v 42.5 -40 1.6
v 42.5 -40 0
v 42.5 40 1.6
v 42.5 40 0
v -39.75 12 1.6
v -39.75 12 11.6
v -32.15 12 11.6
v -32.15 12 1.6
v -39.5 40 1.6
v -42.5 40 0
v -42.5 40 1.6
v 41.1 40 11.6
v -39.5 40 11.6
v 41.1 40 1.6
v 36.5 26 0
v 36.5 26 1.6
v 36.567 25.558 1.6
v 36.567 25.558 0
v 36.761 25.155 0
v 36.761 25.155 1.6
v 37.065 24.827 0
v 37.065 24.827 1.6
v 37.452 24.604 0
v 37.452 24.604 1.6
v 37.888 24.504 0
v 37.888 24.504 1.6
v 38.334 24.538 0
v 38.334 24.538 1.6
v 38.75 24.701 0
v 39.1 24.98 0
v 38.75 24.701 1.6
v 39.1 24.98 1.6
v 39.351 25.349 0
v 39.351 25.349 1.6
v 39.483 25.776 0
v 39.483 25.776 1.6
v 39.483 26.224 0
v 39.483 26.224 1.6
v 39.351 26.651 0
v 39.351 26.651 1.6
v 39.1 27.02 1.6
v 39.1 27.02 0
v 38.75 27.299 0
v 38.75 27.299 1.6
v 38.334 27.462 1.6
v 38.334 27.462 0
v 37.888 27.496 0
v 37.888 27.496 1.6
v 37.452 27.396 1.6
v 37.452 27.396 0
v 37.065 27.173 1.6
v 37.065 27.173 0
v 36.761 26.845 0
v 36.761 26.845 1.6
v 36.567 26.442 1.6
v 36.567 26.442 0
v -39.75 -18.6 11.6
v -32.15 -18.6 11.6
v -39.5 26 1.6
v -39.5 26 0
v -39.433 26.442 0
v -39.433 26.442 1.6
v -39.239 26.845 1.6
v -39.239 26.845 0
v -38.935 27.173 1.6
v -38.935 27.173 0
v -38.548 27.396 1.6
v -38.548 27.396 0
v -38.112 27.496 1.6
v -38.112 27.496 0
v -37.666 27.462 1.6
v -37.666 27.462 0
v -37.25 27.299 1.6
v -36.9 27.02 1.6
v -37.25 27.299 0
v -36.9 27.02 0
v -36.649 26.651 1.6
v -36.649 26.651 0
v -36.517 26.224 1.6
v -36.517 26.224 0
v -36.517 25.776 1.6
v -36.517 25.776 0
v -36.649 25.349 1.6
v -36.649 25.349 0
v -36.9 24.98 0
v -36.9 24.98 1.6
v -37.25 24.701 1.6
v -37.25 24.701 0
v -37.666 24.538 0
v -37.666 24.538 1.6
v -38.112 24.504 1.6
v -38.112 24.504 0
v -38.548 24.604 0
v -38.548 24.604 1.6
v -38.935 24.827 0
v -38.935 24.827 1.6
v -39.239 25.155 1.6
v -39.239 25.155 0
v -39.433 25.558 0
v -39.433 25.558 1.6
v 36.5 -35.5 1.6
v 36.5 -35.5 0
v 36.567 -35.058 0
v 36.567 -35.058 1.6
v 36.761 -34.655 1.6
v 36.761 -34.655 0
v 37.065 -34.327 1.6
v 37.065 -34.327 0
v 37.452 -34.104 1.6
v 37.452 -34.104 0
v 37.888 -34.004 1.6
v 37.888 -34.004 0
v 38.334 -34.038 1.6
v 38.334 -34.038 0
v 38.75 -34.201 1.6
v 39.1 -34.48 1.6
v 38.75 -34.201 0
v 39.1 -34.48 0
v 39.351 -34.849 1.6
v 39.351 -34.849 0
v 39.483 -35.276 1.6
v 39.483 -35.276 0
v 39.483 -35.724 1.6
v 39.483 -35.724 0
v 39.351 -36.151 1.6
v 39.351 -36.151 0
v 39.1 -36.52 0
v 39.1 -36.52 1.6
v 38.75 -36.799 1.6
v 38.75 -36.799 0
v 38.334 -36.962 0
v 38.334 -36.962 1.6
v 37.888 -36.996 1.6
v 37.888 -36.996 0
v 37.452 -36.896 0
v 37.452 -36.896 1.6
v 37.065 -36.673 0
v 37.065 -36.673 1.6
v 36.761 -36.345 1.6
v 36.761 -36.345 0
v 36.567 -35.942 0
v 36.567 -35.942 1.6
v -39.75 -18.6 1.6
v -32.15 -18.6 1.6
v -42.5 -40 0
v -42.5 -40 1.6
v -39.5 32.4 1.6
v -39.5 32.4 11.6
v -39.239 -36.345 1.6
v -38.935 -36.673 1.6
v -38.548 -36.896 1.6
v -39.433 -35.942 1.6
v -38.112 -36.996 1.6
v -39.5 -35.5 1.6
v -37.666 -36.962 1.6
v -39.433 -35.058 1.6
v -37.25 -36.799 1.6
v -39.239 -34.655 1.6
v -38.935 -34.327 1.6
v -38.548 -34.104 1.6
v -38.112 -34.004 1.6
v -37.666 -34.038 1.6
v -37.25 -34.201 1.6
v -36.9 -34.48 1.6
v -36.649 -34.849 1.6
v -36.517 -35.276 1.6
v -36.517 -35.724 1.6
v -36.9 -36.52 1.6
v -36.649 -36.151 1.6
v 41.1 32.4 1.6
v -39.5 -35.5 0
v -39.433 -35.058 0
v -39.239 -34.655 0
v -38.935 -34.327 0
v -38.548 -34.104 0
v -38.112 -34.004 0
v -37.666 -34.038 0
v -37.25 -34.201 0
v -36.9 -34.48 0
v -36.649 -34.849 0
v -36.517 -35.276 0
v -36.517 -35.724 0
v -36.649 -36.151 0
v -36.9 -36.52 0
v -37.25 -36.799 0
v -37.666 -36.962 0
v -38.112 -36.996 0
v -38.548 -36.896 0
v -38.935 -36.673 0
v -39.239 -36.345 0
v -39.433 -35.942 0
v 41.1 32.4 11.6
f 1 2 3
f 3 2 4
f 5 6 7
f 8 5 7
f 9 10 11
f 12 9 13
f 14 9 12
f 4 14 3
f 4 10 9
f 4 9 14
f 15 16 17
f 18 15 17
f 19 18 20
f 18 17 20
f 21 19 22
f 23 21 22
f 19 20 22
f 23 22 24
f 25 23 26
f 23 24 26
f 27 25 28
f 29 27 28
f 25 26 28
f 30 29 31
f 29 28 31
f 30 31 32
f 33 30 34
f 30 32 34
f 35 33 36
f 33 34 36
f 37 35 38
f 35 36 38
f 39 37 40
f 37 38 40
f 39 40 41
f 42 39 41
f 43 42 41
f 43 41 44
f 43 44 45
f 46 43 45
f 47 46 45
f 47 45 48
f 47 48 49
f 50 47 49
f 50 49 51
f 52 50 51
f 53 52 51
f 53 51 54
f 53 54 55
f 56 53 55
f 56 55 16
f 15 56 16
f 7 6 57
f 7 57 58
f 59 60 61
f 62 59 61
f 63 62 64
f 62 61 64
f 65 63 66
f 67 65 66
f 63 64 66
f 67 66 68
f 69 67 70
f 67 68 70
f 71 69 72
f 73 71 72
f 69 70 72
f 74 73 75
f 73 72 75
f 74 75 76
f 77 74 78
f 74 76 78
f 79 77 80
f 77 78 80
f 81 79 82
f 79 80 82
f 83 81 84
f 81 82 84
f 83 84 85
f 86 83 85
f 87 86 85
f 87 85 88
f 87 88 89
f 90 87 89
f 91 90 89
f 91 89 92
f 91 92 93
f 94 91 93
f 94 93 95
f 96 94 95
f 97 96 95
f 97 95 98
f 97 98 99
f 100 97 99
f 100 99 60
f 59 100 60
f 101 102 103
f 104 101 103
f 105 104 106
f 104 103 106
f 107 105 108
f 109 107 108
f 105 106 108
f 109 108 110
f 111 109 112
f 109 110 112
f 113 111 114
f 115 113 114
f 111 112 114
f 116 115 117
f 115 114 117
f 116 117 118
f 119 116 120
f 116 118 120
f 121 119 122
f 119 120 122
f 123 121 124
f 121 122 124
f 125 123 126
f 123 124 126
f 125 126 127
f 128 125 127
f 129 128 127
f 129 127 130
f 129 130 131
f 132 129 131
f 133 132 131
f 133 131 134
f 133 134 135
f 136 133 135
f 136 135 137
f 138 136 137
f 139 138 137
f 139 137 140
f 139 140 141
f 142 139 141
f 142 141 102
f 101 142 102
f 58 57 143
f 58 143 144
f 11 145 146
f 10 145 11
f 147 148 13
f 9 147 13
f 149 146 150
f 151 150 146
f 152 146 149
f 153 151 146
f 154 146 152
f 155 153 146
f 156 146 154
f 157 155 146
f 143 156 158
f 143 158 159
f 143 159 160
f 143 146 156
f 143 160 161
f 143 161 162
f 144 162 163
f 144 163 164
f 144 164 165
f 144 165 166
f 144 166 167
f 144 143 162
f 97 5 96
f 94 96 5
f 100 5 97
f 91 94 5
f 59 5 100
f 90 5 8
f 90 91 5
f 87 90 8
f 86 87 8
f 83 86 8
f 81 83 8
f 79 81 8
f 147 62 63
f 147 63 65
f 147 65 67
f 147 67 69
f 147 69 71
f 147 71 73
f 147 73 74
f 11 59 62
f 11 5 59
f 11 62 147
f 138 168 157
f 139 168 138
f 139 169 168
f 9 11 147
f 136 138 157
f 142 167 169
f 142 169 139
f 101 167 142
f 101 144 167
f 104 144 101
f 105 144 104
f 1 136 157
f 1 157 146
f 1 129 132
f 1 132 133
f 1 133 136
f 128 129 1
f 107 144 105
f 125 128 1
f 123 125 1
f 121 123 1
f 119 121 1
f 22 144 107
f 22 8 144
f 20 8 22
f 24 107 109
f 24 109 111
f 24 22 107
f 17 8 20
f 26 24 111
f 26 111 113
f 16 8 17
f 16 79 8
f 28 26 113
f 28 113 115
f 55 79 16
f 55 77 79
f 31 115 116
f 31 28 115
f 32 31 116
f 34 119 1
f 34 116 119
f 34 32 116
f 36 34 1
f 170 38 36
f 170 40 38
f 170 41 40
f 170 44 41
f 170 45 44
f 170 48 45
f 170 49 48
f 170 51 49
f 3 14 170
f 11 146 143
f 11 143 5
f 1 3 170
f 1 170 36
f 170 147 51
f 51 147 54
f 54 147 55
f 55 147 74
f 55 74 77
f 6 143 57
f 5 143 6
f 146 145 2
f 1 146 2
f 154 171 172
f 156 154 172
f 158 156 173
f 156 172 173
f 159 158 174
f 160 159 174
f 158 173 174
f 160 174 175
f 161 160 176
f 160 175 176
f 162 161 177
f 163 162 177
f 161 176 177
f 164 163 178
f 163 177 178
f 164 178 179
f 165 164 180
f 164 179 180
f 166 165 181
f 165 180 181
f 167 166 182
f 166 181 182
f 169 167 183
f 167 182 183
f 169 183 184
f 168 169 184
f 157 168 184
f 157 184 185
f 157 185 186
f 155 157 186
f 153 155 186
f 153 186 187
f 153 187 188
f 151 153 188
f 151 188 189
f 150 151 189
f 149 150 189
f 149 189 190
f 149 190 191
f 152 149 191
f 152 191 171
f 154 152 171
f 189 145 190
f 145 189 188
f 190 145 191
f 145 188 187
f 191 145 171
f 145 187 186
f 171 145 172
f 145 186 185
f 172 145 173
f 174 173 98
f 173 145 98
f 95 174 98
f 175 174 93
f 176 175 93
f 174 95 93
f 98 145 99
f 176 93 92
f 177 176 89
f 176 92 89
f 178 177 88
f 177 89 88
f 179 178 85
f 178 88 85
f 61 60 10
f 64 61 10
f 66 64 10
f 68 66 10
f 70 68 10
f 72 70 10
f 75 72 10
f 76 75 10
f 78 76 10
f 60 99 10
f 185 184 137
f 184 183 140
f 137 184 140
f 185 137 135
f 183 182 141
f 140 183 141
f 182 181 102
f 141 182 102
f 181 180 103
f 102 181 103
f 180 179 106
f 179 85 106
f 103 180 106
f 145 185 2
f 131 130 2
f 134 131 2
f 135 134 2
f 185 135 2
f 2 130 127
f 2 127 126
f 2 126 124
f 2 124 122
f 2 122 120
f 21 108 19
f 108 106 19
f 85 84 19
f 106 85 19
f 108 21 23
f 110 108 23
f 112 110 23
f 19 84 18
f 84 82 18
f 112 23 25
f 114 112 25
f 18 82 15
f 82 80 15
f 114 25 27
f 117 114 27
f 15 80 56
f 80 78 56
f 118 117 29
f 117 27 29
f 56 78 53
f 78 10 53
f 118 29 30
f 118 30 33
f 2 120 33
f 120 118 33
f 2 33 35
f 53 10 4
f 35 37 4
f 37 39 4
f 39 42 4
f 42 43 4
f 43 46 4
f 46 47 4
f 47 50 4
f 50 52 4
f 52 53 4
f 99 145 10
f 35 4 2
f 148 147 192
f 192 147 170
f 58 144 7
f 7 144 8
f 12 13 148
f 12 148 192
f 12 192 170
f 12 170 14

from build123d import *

# Parameters (mm, degrees)
F0_W      = 85
F0_H      = 80
F1_DEPTH  = 1.6
F2_W      = 7.6
F2_H      = 30.6
F3_DEPTH  = 10
F5_D      = 3
F7_D      = 3
F9_D      = 3
F11_D     = 3
F14_W     = 80.6
F14_H     = 7.6
F15_DEPTH = 10


with BuildPart() as f1:
    # F0 (on Top) → F1 (new body)
    with BuildSketch(Plane.XY):
        Rectangle(F0_W, F0_H)
    extrude(amount=F1_DEPTH)

    # F2 (on face) → F3 (join)
    with BuildSketch(Plane.XY.offset(1.6)):
        with Locations((-35.95, -3.3)):
            Rectangle(F2_W, F2_H)
    extrude(amount=F3_DEPTH)

    # F5 (through all)
    with Locations(Plane.XY.offset(1.6)):
        with Locations((-38, 26)):
            Hole(F5_D / 2)

    # F7 (through all)
    with Locations(Plane(origin=(0, 0, 0), x_dir=(1, 0, 0), z_dir=(0, 0, -1))):
        with Locations((38, -26)):
            Hole(F7_D / 2)

    # F9 (through all)
    with Locations(Plane.XY.offset(1.6)):
        with Locations((38, -35.5)):
            Hole(F9_D / 2)

    # F11 (through all)
    with Locations(Plane.XY.offset(1.6)):
        with Locations((-38, -35.5)):
            Hole(F11_D / 2)


with BuildPart() as f12_1:
    # F12: copy of F1
    add(f1.part)


with BuildPart() as f1_1:
    add(f1.part)

    # F14 (on face) → F15 (join)
    with BuildSketch(Plane.XY.offset(1.6)):
        with Locations((0.8, 36.2)):
            Rectangle(F14_W, F14_H)
    extrude(amount=F15_DEPTH)


solid = f1_1.part
